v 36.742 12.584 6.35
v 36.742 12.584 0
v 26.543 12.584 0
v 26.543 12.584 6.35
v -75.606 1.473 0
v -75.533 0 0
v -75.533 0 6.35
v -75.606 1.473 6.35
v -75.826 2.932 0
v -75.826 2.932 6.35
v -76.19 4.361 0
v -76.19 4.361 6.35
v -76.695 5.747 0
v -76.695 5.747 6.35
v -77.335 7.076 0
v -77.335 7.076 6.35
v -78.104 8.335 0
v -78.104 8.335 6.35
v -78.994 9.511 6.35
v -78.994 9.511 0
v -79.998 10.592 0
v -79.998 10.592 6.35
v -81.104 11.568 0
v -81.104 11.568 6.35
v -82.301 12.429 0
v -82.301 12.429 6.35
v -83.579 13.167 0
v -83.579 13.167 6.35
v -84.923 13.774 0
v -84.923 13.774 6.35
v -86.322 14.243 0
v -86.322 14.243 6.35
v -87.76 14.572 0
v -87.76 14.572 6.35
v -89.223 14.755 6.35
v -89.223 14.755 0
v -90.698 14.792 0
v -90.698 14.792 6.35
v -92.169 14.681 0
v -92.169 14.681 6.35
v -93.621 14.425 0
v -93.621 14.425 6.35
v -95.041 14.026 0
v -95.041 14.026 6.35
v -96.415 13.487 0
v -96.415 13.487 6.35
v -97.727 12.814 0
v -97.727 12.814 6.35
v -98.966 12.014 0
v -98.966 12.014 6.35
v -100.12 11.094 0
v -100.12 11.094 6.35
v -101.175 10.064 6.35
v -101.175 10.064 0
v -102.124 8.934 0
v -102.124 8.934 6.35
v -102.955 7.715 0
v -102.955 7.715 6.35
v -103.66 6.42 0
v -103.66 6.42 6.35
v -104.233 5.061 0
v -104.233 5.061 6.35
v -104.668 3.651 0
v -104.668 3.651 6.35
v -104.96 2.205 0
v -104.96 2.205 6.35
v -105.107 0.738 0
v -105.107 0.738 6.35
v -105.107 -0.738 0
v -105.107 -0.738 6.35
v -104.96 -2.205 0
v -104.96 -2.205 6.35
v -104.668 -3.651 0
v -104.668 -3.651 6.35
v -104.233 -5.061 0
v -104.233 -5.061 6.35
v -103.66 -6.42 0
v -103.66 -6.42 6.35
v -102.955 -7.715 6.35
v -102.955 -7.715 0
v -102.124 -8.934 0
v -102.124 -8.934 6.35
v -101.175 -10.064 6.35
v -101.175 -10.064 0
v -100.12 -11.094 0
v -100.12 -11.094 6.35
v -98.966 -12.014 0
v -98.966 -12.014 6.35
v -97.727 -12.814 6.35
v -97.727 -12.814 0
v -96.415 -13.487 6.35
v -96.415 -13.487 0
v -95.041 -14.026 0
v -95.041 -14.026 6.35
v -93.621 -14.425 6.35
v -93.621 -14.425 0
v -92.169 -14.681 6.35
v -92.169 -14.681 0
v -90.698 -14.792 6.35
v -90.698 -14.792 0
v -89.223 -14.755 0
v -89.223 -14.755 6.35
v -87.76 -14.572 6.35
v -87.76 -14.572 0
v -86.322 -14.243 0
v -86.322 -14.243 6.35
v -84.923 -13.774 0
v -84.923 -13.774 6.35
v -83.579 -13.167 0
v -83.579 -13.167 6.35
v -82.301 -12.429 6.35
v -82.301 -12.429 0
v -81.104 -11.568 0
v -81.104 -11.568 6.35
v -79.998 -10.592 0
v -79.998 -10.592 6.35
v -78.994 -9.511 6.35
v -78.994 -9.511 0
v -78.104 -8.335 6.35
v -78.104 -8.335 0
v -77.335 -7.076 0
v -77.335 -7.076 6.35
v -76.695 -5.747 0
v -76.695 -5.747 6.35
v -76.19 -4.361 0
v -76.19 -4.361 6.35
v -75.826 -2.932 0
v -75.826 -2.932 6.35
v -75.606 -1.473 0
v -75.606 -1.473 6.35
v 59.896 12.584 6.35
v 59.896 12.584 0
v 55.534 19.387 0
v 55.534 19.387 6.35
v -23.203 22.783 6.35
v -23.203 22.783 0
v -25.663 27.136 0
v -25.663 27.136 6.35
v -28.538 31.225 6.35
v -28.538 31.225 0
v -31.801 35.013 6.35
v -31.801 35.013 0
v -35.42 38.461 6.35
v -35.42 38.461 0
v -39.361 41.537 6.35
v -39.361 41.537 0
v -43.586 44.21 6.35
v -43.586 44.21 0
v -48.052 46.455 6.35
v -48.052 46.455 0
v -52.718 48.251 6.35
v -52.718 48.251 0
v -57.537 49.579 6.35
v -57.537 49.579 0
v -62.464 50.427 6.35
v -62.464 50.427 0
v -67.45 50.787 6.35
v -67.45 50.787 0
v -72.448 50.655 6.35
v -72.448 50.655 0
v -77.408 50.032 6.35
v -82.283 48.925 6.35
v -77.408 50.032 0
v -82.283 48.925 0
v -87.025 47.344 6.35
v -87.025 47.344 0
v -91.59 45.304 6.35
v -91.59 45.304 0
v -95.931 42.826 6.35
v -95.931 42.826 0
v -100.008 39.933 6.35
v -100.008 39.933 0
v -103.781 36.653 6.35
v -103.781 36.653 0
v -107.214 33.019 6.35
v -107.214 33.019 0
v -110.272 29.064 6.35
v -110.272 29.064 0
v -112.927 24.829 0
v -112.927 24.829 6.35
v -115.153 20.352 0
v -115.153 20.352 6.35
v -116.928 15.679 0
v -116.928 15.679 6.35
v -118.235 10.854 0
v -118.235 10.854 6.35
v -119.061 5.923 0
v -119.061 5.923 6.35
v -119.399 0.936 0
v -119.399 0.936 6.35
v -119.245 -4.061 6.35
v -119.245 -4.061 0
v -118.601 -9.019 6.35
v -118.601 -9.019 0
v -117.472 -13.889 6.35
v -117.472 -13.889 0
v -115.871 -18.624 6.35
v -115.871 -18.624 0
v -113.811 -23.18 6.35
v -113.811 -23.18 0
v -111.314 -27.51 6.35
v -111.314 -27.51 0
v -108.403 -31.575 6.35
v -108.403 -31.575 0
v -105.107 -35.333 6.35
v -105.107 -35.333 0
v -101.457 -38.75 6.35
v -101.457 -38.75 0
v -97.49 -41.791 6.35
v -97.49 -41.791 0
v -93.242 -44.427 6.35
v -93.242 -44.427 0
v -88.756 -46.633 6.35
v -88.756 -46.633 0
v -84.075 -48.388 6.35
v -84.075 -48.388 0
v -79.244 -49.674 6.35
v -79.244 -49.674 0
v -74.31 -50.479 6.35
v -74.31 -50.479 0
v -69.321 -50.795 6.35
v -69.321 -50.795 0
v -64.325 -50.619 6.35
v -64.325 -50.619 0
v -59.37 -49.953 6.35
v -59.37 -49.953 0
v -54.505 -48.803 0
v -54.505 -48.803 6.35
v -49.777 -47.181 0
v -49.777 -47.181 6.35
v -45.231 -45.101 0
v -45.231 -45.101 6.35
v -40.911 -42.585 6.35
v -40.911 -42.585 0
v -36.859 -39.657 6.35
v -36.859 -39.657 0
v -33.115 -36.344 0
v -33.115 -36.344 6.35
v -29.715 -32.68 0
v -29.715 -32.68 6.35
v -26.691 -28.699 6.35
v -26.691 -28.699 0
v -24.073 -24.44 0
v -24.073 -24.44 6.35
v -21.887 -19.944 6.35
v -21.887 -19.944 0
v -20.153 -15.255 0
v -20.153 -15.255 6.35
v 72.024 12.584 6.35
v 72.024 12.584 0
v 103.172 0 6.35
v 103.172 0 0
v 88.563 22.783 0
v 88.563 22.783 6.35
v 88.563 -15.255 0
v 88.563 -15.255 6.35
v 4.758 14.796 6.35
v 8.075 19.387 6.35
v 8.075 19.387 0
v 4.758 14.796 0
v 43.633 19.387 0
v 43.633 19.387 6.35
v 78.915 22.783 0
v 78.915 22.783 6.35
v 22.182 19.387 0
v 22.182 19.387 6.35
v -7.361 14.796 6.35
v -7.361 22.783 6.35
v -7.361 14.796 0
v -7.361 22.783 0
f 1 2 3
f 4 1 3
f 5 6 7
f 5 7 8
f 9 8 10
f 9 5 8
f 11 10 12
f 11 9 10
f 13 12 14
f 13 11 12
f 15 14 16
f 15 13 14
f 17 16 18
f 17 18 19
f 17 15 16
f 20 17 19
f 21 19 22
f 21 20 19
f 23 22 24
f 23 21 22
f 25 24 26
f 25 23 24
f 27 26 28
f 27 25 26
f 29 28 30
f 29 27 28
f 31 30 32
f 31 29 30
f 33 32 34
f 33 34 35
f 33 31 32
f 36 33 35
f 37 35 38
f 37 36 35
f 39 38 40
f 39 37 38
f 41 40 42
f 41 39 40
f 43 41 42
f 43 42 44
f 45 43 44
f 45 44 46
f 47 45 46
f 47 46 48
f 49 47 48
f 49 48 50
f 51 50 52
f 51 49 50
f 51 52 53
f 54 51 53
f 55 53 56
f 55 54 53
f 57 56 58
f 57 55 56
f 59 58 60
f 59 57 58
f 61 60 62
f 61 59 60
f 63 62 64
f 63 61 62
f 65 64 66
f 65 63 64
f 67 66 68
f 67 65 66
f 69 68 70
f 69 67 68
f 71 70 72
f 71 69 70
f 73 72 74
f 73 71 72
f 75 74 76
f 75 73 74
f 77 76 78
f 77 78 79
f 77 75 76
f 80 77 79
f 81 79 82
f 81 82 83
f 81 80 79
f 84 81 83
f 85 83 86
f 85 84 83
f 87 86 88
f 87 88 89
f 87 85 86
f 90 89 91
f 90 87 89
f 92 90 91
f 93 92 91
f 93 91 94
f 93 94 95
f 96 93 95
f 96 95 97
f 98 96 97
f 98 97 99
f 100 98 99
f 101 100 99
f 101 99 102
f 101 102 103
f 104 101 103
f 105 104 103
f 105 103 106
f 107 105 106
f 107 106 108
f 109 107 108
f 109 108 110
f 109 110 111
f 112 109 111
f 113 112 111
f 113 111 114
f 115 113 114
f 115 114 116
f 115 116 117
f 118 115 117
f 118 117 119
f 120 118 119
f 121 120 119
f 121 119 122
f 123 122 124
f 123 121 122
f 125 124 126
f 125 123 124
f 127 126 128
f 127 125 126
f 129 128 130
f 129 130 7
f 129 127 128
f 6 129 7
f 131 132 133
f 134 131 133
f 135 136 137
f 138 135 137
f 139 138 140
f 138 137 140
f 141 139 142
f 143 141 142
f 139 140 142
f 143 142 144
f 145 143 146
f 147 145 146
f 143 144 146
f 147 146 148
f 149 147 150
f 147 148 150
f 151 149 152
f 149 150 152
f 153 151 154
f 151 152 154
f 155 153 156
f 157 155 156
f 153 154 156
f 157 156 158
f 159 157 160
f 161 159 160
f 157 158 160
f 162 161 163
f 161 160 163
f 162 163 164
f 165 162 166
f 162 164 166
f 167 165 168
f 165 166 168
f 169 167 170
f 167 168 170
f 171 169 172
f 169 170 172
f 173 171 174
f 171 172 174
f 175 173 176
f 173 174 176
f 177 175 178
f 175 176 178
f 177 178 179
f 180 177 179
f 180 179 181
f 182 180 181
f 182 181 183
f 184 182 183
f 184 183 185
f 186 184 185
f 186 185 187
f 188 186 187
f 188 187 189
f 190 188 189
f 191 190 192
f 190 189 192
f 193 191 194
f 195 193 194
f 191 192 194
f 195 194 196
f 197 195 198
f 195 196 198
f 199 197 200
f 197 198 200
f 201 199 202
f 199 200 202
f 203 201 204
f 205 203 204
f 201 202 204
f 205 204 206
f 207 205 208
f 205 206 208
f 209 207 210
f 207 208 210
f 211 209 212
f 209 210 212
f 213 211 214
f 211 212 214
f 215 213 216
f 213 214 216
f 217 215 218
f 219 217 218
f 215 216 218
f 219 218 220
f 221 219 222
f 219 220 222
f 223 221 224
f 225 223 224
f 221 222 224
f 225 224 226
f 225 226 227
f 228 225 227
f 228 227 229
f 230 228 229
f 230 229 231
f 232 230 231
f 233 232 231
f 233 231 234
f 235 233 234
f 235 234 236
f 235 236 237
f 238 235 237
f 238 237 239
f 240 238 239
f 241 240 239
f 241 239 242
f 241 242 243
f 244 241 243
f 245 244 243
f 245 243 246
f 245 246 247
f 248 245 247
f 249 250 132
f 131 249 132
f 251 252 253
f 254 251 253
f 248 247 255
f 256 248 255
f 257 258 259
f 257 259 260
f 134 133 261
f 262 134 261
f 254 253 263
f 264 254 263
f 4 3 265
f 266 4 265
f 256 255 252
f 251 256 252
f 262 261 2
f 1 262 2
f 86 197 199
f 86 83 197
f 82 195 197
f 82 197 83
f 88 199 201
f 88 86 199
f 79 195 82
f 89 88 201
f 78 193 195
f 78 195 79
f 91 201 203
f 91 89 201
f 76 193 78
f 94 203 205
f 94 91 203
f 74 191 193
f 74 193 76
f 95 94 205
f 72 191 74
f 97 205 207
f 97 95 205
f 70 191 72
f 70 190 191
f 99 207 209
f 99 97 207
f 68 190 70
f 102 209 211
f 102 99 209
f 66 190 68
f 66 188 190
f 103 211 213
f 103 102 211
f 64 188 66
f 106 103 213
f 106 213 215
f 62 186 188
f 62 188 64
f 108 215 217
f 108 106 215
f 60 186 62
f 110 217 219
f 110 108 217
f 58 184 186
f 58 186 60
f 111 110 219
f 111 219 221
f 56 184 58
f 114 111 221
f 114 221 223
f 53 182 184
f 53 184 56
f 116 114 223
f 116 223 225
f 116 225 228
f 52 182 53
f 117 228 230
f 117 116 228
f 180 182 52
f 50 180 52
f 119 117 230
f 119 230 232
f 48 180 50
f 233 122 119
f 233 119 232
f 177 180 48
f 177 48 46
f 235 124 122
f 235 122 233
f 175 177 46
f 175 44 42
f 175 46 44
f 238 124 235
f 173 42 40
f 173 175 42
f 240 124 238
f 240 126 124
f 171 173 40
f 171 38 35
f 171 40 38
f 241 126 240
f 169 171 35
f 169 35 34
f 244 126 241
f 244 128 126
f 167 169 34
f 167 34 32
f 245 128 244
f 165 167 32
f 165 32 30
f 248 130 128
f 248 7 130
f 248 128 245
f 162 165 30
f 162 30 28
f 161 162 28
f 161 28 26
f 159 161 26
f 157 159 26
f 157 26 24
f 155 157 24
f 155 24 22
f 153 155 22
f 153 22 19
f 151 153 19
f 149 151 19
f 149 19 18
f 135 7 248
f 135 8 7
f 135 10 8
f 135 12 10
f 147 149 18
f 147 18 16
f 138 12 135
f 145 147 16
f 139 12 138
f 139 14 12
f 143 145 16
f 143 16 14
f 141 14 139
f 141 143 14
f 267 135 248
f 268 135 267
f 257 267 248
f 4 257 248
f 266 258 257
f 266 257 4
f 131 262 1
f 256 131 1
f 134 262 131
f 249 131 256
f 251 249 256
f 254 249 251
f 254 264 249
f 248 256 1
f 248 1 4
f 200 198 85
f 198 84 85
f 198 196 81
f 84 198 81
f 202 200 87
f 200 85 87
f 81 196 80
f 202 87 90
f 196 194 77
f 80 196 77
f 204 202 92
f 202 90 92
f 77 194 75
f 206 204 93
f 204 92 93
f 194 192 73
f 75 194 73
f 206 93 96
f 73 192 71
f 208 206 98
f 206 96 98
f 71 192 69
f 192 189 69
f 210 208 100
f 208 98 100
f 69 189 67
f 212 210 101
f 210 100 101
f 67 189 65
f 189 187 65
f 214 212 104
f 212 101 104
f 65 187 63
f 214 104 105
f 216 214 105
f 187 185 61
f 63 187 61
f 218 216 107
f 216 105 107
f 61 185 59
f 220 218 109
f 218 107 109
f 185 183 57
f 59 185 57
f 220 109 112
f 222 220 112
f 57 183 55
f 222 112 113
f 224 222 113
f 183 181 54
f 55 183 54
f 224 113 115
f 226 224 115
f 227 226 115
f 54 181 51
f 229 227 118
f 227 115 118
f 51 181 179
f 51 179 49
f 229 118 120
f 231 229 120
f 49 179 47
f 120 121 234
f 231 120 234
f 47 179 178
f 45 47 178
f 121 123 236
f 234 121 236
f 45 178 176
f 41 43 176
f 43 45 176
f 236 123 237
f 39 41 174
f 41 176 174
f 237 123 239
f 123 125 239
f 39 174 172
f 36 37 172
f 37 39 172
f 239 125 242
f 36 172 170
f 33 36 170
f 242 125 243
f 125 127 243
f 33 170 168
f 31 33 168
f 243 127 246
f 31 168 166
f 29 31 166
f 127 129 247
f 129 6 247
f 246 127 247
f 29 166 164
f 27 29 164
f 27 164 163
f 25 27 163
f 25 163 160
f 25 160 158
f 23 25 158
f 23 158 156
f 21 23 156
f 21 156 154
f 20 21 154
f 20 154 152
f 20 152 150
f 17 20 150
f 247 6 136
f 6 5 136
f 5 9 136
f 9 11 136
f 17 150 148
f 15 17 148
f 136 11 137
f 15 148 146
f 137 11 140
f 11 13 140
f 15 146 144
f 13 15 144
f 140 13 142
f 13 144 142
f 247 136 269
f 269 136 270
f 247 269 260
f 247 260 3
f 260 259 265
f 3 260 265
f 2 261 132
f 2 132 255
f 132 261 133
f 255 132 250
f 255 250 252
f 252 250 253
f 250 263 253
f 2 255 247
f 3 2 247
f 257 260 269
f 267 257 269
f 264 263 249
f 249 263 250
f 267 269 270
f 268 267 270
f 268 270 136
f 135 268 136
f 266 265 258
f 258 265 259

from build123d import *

# Parameters (mm, degrees)
F0_R     = 14.796322
F1_DEPTH = 6.35


with BuildPart() as f1:
    # F0 (on Top) → F1 (new body)
    with BuildSketch(Plane.XY):
        with BuildLine():
            Line((-27.206885, 22.783245), (-23.203398, 22.783245))
            ThreePointArc((-23.203398, 22.783245), (-119.245242, -4.061273), (-20.152583, -15.255412))
            Line((-20.152583, -15.255412), (-27.206885, -15.255412))
            Line((-27.206885, -15.255412), (-27.206885, 22.783245))
        make_face()
        with Locations((-90.329006, 0)):
            Circle(F0_R, mode=Mode.SUBTRACT)
        with BuildLine():
            ThreePointArc((-23.203398, 22.783245), (-19.175133, 11.70671), (-17.807844, 0))
            ThreePointArc((-17.807844, 0), (-18.397451, -7.717276), (-20.152583, -15.255412))
            Line((-20.152583, -15.255412), (88.56295, -15.255412))
            Line((88.56295, -15.255412), (103.171997, 0))
            Line((103.171997, 0), (88.56295, 22.783245))
            Line((88.56295, 22.783245), (78.915462, 22.783245))
            Line((78.915462, 22.783245), (72.024398, 12.584476))
            Line((72.024398, 12.584476), (59.896126, 12.584476))
            Line((59.896126, 12.584476), (55.534395, 19.386727))
            Line((55.534395, 19.386727), (43.63323, 19.386727))
            Line((43.63323, 19.386727), (36.742169, 12.584476))
            Line((36.742169, 12.584476), (26.543396, 12.584476))
            Line((26.543396, 12.584476), (22.181664, 19.386727))
            Line((22.181664, 19.386727), (8.075351, 19.386727))
            Line((8.075351, 19.386727), (4.758361, 14.796322))
            Line((4.758361, 14.796322), (-7.360628, 14.796322))
            Line((-7.360628, 14.796322), (-7.360628, 22.783245))
            Line((-7.360628, 22.783245), (-23.203398, 22.783245))
        make_face()
        with BuildLine():
            ThreePointArc((-20.152583, -15.255412), (-18.397451, -7.717276), (-17.807844, 0))
            ThreePointArc((-17.807844, 0), (-19.175133, 11.70671), (-23.203398, 22.783245))
            Line((-23.203398, 22.783245), (-27.206885, 22.783245))
            Line((-27.206885, 22.783245), (-27.206885, -15.255412))
            Line((-27.206885, -15.255412), (-20.152583, -15.255412))
        make_face()
    extrude(amount=F1_DEPTH)


solid = f1.part
